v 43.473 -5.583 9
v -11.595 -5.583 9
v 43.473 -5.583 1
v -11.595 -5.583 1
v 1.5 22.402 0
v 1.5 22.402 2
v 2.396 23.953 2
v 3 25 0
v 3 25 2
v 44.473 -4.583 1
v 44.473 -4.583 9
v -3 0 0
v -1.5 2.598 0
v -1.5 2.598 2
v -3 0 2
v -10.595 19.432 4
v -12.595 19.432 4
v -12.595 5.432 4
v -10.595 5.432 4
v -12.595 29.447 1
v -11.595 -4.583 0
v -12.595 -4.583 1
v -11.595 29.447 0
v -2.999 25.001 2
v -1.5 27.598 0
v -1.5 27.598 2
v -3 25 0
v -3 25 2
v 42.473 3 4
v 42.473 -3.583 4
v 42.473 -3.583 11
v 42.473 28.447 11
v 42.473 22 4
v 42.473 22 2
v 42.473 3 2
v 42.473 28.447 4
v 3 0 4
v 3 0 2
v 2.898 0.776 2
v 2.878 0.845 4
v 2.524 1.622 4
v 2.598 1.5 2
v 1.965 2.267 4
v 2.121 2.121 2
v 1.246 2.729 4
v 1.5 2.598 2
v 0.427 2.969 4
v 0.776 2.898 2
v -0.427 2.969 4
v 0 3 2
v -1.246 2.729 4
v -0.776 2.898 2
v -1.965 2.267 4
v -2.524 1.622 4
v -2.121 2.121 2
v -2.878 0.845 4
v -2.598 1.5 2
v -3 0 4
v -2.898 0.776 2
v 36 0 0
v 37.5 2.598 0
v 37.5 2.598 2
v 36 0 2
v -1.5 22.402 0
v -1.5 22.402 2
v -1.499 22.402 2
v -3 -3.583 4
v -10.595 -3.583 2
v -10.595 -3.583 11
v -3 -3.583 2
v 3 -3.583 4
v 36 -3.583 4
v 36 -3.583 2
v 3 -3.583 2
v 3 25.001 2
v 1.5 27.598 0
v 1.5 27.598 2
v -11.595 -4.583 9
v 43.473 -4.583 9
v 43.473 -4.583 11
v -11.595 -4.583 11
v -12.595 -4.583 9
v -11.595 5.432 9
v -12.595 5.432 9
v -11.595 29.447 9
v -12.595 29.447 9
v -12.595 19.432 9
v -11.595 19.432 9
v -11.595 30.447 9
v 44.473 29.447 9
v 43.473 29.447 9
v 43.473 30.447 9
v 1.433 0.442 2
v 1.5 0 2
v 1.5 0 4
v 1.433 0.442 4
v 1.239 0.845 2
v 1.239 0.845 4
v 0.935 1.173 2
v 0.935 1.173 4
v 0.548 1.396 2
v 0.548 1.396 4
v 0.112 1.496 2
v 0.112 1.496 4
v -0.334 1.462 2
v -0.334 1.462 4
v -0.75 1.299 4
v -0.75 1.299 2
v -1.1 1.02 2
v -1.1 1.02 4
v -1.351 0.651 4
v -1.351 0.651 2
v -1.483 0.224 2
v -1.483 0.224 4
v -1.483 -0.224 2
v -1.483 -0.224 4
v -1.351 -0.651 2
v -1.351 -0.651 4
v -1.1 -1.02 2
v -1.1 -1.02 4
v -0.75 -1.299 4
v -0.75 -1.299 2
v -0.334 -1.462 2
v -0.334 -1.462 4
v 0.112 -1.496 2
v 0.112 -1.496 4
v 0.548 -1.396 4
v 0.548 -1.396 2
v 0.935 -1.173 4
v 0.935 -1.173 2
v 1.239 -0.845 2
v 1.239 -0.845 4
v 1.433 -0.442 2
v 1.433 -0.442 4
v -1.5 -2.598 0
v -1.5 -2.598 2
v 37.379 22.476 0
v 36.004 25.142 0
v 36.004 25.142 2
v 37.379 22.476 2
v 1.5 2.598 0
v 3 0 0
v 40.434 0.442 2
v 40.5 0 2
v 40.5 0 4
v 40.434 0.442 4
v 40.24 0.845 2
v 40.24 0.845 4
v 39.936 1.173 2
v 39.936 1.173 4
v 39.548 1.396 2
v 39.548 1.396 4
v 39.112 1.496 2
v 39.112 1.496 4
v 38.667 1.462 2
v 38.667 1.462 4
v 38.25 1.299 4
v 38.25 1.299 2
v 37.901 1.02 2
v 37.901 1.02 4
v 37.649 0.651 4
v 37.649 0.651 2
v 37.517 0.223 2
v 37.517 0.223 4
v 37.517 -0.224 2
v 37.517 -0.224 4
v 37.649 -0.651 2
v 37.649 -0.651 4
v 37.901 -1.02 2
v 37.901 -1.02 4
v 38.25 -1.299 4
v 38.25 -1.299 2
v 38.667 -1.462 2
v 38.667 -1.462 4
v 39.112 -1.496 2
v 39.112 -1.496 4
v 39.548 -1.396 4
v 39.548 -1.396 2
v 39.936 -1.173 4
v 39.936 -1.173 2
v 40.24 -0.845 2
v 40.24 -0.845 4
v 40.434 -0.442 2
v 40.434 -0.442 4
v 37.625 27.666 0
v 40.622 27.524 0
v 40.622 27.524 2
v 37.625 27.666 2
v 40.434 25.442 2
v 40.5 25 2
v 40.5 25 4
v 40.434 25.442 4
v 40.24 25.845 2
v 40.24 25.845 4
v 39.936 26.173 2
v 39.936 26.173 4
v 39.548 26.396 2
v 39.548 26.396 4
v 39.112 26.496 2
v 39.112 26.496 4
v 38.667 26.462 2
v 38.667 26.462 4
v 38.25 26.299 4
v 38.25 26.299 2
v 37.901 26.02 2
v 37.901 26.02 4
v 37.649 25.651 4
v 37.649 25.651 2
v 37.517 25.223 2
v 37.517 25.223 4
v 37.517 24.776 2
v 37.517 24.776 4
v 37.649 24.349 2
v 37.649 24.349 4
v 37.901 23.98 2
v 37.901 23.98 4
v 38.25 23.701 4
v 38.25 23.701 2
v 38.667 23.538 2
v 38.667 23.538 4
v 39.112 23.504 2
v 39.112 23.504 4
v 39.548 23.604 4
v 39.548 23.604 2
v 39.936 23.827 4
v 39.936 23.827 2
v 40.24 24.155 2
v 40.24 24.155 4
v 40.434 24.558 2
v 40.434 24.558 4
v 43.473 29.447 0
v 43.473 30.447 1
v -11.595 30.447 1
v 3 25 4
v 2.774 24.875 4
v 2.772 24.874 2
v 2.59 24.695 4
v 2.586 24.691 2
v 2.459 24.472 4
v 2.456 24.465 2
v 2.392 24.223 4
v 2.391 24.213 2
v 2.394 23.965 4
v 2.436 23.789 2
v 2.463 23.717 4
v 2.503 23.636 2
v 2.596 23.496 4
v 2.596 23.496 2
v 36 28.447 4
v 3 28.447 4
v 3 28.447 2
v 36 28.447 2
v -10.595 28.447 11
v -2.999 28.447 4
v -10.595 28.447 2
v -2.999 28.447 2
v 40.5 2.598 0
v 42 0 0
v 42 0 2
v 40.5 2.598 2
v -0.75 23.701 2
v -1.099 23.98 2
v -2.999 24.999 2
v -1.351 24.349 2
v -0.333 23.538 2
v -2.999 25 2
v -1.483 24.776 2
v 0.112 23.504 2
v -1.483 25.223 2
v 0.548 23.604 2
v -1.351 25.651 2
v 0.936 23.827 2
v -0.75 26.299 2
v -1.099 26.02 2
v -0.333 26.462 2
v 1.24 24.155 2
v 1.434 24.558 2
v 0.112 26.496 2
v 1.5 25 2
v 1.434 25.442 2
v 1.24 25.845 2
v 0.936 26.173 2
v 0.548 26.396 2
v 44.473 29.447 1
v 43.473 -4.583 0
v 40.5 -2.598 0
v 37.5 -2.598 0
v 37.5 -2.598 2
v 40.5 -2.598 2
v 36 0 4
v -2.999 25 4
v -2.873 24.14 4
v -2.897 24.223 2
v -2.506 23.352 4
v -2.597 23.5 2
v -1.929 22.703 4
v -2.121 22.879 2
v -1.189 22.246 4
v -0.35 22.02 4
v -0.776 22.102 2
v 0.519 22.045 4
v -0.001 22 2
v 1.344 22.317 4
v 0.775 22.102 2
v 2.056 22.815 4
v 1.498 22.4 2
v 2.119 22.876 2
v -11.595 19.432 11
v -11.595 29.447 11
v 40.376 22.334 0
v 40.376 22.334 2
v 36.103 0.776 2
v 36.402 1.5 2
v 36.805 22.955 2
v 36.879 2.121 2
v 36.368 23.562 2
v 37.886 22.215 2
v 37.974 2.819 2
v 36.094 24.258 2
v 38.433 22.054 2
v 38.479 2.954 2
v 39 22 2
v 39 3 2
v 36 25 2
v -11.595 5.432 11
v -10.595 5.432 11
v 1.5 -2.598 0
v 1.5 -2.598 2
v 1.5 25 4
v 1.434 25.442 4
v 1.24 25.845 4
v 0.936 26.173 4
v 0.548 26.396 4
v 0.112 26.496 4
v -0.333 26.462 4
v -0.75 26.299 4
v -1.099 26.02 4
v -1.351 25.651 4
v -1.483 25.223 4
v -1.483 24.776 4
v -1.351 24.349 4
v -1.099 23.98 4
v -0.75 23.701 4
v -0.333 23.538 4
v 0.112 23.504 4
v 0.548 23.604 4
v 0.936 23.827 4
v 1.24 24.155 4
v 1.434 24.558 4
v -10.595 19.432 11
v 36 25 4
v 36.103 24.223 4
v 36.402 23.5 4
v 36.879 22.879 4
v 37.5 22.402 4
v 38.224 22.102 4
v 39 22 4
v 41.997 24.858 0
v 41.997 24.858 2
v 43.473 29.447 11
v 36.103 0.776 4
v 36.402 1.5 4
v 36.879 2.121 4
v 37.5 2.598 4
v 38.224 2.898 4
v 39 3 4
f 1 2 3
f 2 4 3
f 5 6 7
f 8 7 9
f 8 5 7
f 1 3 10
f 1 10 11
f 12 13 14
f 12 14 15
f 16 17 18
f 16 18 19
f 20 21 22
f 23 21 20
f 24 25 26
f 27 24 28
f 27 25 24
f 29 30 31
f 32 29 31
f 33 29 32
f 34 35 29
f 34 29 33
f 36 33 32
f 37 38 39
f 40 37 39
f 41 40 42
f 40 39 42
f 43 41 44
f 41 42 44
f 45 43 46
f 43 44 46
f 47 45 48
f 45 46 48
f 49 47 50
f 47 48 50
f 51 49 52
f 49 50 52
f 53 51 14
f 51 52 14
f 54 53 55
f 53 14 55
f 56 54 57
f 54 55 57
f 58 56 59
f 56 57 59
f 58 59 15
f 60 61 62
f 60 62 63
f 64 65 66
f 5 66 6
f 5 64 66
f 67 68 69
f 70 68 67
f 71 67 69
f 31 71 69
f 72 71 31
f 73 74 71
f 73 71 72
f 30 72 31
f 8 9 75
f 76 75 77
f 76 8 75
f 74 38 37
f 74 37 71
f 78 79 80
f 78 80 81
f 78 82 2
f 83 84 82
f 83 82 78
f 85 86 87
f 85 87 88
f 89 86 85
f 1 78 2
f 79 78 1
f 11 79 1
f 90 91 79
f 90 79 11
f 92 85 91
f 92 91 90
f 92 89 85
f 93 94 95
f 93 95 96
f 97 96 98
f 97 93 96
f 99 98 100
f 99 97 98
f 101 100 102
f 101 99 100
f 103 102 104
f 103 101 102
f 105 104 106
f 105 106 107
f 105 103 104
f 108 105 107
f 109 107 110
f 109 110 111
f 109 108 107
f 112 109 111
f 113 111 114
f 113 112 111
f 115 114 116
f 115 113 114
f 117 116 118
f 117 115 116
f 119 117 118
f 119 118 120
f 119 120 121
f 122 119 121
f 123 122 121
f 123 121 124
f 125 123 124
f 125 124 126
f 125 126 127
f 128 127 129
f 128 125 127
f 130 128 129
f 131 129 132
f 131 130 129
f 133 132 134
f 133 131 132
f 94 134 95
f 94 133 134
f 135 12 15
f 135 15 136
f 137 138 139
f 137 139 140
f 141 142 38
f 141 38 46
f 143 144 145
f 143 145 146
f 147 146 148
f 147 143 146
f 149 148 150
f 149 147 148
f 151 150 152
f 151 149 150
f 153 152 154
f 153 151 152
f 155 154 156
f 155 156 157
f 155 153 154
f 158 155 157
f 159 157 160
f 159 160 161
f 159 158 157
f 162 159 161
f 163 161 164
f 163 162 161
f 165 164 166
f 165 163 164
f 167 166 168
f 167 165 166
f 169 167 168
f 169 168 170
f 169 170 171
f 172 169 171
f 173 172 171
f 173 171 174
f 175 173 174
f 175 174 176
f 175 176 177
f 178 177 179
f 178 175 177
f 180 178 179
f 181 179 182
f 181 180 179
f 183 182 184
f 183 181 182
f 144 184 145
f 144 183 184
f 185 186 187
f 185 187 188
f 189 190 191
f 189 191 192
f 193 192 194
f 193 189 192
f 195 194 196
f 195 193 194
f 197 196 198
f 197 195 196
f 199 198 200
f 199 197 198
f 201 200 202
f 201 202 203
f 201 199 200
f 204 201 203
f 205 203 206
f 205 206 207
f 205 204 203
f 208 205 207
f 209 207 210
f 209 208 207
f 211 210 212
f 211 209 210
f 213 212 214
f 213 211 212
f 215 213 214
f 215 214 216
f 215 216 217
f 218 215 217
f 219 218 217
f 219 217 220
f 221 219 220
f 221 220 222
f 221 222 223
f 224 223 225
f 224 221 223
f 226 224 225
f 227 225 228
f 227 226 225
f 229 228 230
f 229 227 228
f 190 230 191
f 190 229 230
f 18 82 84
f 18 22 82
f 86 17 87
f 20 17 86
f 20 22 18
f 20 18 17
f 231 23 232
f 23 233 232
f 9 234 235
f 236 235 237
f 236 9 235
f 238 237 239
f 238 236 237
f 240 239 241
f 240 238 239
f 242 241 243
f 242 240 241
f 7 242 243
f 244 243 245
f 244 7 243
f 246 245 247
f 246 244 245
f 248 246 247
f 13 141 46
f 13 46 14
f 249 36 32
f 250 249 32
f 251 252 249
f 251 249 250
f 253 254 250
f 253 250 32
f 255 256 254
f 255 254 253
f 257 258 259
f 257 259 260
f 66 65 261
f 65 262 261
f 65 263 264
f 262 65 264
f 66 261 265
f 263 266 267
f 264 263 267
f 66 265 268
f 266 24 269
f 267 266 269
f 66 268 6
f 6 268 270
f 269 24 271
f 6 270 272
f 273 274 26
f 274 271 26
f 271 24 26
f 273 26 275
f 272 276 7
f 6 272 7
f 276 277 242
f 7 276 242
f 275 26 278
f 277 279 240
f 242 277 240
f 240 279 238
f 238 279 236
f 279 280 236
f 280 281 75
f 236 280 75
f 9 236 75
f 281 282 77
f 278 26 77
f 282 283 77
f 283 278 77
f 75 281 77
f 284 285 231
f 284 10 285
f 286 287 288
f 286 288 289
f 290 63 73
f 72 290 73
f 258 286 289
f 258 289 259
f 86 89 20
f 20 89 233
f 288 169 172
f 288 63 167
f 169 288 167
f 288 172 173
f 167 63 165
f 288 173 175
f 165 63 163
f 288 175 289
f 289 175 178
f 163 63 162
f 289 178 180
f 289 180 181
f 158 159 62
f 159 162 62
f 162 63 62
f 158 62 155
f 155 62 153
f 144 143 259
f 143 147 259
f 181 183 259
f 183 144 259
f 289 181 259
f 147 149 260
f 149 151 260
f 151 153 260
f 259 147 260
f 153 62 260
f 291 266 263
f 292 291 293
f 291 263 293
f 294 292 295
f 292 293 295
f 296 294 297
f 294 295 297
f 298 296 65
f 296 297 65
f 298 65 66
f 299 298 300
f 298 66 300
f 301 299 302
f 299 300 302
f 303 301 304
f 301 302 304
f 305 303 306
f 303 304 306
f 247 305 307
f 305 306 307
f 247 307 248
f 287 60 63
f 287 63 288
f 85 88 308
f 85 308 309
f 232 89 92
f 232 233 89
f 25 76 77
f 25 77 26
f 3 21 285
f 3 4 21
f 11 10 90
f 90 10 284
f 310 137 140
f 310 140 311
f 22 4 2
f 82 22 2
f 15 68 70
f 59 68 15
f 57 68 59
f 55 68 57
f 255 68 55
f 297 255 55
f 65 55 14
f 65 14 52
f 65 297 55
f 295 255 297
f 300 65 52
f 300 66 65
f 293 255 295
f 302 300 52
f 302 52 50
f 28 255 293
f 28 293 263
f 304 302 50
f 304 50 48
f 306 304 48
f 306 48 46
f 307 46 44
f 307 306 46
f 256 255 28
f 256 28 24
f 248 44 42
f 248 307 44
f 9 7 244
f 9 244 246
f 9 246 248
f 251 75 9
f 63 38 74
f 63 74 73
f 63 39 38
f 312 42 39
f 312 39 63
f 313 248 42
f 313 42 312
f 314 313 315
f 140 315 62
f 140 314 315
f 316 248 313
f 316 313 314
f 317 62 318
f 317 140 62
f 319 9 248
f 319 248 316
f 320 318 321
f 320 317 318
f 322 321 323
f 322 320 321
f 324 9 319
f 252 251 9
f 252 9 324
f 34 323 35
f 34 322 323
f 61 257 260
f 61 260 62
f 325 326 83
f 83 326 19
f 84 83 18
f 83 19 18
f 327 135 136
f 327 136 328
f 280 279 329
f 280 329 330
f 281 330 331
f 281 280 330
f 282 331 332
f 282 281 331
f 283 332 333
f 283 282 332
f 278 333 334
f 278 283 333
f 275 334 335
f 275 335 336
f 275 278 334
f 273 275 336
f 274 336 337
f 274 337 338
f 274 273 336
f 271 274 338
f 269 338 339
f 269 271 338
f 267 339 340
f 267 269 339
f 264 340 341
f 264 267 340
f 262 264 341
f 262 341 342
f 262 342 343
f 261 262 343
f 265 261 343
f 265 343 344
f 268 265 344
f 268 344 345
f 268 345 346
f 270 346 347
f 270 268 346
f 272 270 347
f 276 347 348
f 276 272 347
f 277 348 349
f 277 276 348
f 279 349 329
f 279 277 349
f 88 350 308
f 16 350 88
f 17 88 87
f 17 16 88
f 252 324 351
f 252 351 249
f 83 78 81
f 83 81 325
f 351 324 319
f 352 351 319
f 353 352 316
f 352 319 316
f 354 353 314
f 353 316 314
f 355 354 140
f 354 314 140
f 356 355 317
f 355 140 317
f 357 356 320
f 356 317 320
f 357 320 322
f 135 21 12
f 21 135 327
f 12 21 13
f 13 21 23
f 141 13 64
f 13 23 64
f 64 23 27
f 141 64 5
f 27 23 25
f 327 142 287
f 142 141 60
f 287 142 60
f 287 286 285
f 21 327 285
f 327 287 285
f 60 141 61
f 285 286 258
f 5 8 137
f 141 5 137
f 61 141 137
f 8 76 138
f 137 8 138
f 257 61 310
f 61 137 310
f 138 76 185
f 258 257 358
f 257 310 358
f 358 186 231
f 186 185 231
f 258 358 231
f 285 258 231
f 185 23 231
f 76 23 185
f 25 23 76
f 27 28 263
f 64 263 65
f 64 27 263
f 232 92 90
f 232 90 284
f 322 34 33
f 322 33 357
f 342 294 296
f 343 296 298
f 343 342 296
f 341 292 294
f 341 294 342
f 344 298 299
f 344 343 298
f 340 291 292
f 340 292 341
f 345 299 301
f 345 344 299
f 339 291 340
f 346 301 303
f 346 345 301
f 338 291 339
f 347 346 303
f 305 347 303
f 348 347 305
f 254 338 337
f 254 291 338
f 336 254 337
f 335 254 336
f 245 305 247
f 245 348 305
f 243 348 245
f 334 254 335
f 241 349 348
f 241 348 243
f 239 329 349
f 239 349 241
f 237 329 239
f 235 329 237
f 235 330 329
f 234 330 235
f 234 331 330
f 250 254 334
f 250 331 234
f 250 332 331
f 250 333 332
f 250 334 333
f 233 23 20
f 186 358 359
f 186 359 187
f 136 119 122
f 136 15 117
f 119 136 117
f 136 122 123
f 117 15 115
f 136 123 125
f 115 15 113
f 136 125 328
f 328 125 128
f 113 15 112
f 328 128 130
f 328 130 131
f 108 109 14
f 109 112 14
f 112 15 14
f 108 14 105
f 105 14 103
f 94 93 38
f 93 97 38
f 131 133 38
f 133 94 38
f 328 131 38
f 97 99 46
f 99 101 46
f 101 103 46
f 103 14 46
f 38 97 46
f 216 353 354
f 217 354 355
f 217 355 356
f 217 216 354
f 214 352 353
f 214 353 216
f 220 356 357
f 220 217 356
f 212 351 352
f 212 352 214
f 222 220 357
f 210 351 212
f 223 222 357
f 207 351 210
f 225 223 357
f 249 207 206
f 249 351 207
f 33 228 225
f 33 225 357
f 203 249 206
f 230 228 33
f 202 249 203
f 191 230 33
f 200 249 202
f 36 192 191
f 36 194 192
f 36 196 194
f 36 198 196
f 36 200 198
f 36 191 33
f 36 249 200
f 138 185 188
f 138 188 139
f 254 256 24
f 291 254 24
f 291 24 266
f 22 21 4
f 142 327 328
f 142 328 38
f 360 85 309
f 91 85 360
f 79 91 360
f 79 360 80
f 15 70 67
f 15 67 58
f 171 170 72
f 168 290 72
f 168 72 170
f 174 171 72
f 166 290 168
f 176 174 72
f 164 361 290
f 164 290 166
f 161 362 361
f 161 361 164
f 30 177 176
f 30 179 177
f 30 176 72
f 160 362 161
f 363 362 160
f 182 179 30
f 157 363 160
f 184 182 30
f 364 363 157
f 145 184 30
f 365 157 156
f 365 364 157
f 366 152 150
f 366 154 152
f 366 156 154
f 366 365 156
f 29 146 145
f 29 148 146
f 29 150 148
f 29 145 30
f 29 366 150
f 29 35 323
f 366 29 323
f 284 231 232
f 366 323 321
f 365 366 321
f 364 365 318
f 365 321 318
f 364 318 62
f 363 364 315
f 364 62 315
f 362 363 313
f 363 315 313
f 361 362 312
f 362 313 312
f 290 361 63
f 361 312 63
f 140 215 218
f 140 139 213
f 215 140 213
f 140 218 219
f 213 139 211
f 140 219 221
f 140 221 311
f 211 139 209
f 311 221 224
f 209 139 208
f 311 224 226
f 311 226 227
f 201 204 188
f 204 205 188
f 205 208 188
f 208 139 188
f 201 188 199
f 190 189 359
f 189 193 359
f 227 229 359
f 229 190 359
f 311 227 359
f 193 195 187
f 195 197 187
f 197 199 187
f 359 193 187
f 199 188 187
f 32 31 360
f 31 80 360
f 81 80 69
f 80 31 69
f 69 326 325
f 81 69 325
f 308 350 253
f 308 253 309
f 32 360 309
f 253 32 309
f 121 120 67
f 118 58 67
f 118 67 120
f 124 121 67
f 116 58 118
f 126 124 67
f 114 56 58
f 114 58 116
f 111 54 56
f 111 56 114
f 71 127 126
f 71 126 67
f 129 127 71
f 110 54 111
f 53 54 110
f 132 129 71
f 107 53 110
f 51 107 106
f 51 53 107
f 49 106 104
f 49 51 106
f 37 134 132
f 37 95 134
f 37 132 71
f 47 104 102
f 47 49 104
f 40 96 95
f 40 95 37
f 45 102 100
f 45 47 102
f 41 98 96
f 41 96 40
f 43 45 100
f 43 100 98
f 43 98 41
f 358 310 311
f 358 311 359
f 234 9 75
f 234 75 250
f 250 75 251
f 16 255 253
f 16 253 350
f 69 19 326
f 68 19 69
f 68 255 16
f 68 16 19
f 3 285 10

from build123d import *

# Parameters (mm, degrees)
EXTRUDE003_DEPTH = 2
SKETCH001_W      = 57.0675
SKETCH001_H      = 36.03
SKETCH001_R      = 1.5
EXTRUDE001_DEPTH = 2
SKETCH006_W      = 57.0675
SKETCH006_H      = 36.03
EXTRUDE006_DEPTH = 2
EXTRUDE002_DEPTH = 5
CHAMFER001_SIZE  = 1


with BuildPart() as encaixe_interno:
    # Sketch003 → Extrude003 (new body)
    with BuildSketch(Plane.XY.offset(9)):
        Polygon((-11.59465, 29.4474), (43.47285, 29.4474), (43.47285, -4.5826), (-11.59465, -4.5826), (-11.59465, 5.4324), (-10.59465, 5.4324), (-10.59465, -3.5826), (42.47285, -3.5826), (42.47285, 28.4474), (-10.59465, 28.4474), (-10.59465, 19.4324), (-11.59465, 19.4324), align=None)
    extrude(amount=EXTRUDE003_DEPTH)


with BuildPart() as borda_base:
    # Sketch001 → Extrude001 (new body)
    with BuildSketch(Plane.XY.offset(2)):
        with Locations((15.9391, 12.4324)):
            Rectangle(SKETCH001_W, SKETCH001_H)
        with Locations((0.00035, 24.9999)):
            Circle(SKETCH001_R, mode=Mode.SUBTRACT)
        with Locations((39.00035, 24.9999)):
            Circle(SKETCH001_R, mode=Mode.SUBTRACT)
        with Locations((39.00035, -0.0001)):
            Circle(SKETCH001_R, mode=Mode.SUBTRACT)
        Circle(SKETCH001_R, mode=Mode.SUBTRACT)
        with BuildLine():
            Line((-10.59465, 28.4474), (-2.9993, 28.4474))
            Line((-2.9993, 28.4474), (-2.9993, 24.9999))
            ThreePointArc((-2.9993, 24.9999), (-0.777953, 22.102712), (2.5965, 23.495965))
            ThreePointArc((3, 24.9999), (2.417325, 24.350133), (2.5965, 23.495965))
            Line((3, 24.9999), (3, 28.4474))
            Line((3, 28.4474), (36.00035, 28.4474))
            Line((36.00035, 24.9999), (36.00035, 28.4474))
            ThreePointArc((36.00035, 24.9999), (36.87903, 22.87858), (39.00035, 21.9999))
            Line((42.47285, 21.9999), (39.00035, 21.9999))
            Line((42.47285, 21.9999), (42.47285, 2.9999))
            Line((42.47285, 2.9999), (39.00035, 2.9999))
            ThreePointArc((39.00035, 2.9999), (36.87903, 2.12122), (36.00035, -0.0001))
            Line((36.00035, -0.0001), (36.00035, -3.5826))
            Line((36.00035, -3.5826), (3, -3.5826))
            Line((3, 0), (3, -3.5826))
            ThreePointArc((3, 0), (0, 3), (-3, 0))
            Line((-3, -3.5826), (-3, 0))
            Line((-3, -3.5826), (-10.59465, -3.5826))
            Line((-10.59465, -3.5826), (-10.59465, 28.4474))
        make_face(mode=Mode.SUBTRACT)
    extrude(amount=EXTRUDE001_DEPTH)


with BuildPart() as base:
    # Sketch006 → Extrude006 (new body)
    with BuildSketch(Plane.XY):
        with Locations((15.9391, 12.4324)):
            Rectangle(SKETCH006_W, SKETCH006_H)
        Polygon((41.996992, 24.857996), (40.621563, 27.524116), (37.624921, 27.66602), (36.003708, 25.141804), (37.379137, 22.475684), (40.375779, 22.33378), align=None, mode=Mode.SUBTRACT)
        Polygon((3.00035, 24.9999), (1.50035, 27.597976), (-1.49965, 27.597976), (-2.99965, 24.9999), (-1.49965, 22.401824), (1.50035, 22.401824), align=None, mode=Mode.SUBTRACT)
        Polygon((3, 0), (1.5, 2.598076), (-1.5, 2.598076), (-3, 0), (-1.5, -2.598076), (1.5, -2.598076), align=None, mode=Mode.SUBTRACT)
        Polygon((36.00035, 0), (37.500263, -2.598126), (40.500263, -2.598226), (42.00035, -0.0002), (40.500437, 2.597926), (37.500437, 2.598026), align=None, mode=Mode.SUBTRACT)
    extrude(amount=EXTRUDE006_DEPTH)


with BuildPart() as fusion002:
    # Sketch002 → Extrude002 (new body)
    with BuildSketch(Plane.XY.offset(4)):
        Polygon((-10.59465, 28.4474), (42.47285, 28.4474), (42.47285, -3.5826), (-10.59465, -3.5826), (-10.59465, 5.4324), (-12.59465, 5.4324), (-12.59465, -5.5826), (44.47285, -5.5826), (44.47285, 30.4474), (-12.59465, 30.4474), (-12.59465, 19.4324), (-10.59465, 19.4324), align=None)
    extrude(amount=EXTRUDE002_DEPTH)

    # Fusion: union Borda Base, BASE
    add(borda_base.part)
    add(base.part)

    # Chamfer001
    chamfer001_edges = [fusion002.edges().sort_by_distance(p)[0] for p in [
        (15.9391, 30.4474, 0),
        (44.47285, 12.4324, 0),
        (15.9391, -5.5826, 0),
        (-12.59465, 12.4324, 0),
        (-12.59465, 30.4474, 4.5),
        (-12.59465, -5.5826, 4.5),
        (44.47285, -5.5826, 4.5),
        (44.47285, 30.4474, 4.5),
    ]]
    chamfer(chamfer001_edges, length=CHAMFER001_SIZE)

    # Fusion002: union Encaixe Interno
    add(encaixe_interno.part)


solid = fusion002.part
